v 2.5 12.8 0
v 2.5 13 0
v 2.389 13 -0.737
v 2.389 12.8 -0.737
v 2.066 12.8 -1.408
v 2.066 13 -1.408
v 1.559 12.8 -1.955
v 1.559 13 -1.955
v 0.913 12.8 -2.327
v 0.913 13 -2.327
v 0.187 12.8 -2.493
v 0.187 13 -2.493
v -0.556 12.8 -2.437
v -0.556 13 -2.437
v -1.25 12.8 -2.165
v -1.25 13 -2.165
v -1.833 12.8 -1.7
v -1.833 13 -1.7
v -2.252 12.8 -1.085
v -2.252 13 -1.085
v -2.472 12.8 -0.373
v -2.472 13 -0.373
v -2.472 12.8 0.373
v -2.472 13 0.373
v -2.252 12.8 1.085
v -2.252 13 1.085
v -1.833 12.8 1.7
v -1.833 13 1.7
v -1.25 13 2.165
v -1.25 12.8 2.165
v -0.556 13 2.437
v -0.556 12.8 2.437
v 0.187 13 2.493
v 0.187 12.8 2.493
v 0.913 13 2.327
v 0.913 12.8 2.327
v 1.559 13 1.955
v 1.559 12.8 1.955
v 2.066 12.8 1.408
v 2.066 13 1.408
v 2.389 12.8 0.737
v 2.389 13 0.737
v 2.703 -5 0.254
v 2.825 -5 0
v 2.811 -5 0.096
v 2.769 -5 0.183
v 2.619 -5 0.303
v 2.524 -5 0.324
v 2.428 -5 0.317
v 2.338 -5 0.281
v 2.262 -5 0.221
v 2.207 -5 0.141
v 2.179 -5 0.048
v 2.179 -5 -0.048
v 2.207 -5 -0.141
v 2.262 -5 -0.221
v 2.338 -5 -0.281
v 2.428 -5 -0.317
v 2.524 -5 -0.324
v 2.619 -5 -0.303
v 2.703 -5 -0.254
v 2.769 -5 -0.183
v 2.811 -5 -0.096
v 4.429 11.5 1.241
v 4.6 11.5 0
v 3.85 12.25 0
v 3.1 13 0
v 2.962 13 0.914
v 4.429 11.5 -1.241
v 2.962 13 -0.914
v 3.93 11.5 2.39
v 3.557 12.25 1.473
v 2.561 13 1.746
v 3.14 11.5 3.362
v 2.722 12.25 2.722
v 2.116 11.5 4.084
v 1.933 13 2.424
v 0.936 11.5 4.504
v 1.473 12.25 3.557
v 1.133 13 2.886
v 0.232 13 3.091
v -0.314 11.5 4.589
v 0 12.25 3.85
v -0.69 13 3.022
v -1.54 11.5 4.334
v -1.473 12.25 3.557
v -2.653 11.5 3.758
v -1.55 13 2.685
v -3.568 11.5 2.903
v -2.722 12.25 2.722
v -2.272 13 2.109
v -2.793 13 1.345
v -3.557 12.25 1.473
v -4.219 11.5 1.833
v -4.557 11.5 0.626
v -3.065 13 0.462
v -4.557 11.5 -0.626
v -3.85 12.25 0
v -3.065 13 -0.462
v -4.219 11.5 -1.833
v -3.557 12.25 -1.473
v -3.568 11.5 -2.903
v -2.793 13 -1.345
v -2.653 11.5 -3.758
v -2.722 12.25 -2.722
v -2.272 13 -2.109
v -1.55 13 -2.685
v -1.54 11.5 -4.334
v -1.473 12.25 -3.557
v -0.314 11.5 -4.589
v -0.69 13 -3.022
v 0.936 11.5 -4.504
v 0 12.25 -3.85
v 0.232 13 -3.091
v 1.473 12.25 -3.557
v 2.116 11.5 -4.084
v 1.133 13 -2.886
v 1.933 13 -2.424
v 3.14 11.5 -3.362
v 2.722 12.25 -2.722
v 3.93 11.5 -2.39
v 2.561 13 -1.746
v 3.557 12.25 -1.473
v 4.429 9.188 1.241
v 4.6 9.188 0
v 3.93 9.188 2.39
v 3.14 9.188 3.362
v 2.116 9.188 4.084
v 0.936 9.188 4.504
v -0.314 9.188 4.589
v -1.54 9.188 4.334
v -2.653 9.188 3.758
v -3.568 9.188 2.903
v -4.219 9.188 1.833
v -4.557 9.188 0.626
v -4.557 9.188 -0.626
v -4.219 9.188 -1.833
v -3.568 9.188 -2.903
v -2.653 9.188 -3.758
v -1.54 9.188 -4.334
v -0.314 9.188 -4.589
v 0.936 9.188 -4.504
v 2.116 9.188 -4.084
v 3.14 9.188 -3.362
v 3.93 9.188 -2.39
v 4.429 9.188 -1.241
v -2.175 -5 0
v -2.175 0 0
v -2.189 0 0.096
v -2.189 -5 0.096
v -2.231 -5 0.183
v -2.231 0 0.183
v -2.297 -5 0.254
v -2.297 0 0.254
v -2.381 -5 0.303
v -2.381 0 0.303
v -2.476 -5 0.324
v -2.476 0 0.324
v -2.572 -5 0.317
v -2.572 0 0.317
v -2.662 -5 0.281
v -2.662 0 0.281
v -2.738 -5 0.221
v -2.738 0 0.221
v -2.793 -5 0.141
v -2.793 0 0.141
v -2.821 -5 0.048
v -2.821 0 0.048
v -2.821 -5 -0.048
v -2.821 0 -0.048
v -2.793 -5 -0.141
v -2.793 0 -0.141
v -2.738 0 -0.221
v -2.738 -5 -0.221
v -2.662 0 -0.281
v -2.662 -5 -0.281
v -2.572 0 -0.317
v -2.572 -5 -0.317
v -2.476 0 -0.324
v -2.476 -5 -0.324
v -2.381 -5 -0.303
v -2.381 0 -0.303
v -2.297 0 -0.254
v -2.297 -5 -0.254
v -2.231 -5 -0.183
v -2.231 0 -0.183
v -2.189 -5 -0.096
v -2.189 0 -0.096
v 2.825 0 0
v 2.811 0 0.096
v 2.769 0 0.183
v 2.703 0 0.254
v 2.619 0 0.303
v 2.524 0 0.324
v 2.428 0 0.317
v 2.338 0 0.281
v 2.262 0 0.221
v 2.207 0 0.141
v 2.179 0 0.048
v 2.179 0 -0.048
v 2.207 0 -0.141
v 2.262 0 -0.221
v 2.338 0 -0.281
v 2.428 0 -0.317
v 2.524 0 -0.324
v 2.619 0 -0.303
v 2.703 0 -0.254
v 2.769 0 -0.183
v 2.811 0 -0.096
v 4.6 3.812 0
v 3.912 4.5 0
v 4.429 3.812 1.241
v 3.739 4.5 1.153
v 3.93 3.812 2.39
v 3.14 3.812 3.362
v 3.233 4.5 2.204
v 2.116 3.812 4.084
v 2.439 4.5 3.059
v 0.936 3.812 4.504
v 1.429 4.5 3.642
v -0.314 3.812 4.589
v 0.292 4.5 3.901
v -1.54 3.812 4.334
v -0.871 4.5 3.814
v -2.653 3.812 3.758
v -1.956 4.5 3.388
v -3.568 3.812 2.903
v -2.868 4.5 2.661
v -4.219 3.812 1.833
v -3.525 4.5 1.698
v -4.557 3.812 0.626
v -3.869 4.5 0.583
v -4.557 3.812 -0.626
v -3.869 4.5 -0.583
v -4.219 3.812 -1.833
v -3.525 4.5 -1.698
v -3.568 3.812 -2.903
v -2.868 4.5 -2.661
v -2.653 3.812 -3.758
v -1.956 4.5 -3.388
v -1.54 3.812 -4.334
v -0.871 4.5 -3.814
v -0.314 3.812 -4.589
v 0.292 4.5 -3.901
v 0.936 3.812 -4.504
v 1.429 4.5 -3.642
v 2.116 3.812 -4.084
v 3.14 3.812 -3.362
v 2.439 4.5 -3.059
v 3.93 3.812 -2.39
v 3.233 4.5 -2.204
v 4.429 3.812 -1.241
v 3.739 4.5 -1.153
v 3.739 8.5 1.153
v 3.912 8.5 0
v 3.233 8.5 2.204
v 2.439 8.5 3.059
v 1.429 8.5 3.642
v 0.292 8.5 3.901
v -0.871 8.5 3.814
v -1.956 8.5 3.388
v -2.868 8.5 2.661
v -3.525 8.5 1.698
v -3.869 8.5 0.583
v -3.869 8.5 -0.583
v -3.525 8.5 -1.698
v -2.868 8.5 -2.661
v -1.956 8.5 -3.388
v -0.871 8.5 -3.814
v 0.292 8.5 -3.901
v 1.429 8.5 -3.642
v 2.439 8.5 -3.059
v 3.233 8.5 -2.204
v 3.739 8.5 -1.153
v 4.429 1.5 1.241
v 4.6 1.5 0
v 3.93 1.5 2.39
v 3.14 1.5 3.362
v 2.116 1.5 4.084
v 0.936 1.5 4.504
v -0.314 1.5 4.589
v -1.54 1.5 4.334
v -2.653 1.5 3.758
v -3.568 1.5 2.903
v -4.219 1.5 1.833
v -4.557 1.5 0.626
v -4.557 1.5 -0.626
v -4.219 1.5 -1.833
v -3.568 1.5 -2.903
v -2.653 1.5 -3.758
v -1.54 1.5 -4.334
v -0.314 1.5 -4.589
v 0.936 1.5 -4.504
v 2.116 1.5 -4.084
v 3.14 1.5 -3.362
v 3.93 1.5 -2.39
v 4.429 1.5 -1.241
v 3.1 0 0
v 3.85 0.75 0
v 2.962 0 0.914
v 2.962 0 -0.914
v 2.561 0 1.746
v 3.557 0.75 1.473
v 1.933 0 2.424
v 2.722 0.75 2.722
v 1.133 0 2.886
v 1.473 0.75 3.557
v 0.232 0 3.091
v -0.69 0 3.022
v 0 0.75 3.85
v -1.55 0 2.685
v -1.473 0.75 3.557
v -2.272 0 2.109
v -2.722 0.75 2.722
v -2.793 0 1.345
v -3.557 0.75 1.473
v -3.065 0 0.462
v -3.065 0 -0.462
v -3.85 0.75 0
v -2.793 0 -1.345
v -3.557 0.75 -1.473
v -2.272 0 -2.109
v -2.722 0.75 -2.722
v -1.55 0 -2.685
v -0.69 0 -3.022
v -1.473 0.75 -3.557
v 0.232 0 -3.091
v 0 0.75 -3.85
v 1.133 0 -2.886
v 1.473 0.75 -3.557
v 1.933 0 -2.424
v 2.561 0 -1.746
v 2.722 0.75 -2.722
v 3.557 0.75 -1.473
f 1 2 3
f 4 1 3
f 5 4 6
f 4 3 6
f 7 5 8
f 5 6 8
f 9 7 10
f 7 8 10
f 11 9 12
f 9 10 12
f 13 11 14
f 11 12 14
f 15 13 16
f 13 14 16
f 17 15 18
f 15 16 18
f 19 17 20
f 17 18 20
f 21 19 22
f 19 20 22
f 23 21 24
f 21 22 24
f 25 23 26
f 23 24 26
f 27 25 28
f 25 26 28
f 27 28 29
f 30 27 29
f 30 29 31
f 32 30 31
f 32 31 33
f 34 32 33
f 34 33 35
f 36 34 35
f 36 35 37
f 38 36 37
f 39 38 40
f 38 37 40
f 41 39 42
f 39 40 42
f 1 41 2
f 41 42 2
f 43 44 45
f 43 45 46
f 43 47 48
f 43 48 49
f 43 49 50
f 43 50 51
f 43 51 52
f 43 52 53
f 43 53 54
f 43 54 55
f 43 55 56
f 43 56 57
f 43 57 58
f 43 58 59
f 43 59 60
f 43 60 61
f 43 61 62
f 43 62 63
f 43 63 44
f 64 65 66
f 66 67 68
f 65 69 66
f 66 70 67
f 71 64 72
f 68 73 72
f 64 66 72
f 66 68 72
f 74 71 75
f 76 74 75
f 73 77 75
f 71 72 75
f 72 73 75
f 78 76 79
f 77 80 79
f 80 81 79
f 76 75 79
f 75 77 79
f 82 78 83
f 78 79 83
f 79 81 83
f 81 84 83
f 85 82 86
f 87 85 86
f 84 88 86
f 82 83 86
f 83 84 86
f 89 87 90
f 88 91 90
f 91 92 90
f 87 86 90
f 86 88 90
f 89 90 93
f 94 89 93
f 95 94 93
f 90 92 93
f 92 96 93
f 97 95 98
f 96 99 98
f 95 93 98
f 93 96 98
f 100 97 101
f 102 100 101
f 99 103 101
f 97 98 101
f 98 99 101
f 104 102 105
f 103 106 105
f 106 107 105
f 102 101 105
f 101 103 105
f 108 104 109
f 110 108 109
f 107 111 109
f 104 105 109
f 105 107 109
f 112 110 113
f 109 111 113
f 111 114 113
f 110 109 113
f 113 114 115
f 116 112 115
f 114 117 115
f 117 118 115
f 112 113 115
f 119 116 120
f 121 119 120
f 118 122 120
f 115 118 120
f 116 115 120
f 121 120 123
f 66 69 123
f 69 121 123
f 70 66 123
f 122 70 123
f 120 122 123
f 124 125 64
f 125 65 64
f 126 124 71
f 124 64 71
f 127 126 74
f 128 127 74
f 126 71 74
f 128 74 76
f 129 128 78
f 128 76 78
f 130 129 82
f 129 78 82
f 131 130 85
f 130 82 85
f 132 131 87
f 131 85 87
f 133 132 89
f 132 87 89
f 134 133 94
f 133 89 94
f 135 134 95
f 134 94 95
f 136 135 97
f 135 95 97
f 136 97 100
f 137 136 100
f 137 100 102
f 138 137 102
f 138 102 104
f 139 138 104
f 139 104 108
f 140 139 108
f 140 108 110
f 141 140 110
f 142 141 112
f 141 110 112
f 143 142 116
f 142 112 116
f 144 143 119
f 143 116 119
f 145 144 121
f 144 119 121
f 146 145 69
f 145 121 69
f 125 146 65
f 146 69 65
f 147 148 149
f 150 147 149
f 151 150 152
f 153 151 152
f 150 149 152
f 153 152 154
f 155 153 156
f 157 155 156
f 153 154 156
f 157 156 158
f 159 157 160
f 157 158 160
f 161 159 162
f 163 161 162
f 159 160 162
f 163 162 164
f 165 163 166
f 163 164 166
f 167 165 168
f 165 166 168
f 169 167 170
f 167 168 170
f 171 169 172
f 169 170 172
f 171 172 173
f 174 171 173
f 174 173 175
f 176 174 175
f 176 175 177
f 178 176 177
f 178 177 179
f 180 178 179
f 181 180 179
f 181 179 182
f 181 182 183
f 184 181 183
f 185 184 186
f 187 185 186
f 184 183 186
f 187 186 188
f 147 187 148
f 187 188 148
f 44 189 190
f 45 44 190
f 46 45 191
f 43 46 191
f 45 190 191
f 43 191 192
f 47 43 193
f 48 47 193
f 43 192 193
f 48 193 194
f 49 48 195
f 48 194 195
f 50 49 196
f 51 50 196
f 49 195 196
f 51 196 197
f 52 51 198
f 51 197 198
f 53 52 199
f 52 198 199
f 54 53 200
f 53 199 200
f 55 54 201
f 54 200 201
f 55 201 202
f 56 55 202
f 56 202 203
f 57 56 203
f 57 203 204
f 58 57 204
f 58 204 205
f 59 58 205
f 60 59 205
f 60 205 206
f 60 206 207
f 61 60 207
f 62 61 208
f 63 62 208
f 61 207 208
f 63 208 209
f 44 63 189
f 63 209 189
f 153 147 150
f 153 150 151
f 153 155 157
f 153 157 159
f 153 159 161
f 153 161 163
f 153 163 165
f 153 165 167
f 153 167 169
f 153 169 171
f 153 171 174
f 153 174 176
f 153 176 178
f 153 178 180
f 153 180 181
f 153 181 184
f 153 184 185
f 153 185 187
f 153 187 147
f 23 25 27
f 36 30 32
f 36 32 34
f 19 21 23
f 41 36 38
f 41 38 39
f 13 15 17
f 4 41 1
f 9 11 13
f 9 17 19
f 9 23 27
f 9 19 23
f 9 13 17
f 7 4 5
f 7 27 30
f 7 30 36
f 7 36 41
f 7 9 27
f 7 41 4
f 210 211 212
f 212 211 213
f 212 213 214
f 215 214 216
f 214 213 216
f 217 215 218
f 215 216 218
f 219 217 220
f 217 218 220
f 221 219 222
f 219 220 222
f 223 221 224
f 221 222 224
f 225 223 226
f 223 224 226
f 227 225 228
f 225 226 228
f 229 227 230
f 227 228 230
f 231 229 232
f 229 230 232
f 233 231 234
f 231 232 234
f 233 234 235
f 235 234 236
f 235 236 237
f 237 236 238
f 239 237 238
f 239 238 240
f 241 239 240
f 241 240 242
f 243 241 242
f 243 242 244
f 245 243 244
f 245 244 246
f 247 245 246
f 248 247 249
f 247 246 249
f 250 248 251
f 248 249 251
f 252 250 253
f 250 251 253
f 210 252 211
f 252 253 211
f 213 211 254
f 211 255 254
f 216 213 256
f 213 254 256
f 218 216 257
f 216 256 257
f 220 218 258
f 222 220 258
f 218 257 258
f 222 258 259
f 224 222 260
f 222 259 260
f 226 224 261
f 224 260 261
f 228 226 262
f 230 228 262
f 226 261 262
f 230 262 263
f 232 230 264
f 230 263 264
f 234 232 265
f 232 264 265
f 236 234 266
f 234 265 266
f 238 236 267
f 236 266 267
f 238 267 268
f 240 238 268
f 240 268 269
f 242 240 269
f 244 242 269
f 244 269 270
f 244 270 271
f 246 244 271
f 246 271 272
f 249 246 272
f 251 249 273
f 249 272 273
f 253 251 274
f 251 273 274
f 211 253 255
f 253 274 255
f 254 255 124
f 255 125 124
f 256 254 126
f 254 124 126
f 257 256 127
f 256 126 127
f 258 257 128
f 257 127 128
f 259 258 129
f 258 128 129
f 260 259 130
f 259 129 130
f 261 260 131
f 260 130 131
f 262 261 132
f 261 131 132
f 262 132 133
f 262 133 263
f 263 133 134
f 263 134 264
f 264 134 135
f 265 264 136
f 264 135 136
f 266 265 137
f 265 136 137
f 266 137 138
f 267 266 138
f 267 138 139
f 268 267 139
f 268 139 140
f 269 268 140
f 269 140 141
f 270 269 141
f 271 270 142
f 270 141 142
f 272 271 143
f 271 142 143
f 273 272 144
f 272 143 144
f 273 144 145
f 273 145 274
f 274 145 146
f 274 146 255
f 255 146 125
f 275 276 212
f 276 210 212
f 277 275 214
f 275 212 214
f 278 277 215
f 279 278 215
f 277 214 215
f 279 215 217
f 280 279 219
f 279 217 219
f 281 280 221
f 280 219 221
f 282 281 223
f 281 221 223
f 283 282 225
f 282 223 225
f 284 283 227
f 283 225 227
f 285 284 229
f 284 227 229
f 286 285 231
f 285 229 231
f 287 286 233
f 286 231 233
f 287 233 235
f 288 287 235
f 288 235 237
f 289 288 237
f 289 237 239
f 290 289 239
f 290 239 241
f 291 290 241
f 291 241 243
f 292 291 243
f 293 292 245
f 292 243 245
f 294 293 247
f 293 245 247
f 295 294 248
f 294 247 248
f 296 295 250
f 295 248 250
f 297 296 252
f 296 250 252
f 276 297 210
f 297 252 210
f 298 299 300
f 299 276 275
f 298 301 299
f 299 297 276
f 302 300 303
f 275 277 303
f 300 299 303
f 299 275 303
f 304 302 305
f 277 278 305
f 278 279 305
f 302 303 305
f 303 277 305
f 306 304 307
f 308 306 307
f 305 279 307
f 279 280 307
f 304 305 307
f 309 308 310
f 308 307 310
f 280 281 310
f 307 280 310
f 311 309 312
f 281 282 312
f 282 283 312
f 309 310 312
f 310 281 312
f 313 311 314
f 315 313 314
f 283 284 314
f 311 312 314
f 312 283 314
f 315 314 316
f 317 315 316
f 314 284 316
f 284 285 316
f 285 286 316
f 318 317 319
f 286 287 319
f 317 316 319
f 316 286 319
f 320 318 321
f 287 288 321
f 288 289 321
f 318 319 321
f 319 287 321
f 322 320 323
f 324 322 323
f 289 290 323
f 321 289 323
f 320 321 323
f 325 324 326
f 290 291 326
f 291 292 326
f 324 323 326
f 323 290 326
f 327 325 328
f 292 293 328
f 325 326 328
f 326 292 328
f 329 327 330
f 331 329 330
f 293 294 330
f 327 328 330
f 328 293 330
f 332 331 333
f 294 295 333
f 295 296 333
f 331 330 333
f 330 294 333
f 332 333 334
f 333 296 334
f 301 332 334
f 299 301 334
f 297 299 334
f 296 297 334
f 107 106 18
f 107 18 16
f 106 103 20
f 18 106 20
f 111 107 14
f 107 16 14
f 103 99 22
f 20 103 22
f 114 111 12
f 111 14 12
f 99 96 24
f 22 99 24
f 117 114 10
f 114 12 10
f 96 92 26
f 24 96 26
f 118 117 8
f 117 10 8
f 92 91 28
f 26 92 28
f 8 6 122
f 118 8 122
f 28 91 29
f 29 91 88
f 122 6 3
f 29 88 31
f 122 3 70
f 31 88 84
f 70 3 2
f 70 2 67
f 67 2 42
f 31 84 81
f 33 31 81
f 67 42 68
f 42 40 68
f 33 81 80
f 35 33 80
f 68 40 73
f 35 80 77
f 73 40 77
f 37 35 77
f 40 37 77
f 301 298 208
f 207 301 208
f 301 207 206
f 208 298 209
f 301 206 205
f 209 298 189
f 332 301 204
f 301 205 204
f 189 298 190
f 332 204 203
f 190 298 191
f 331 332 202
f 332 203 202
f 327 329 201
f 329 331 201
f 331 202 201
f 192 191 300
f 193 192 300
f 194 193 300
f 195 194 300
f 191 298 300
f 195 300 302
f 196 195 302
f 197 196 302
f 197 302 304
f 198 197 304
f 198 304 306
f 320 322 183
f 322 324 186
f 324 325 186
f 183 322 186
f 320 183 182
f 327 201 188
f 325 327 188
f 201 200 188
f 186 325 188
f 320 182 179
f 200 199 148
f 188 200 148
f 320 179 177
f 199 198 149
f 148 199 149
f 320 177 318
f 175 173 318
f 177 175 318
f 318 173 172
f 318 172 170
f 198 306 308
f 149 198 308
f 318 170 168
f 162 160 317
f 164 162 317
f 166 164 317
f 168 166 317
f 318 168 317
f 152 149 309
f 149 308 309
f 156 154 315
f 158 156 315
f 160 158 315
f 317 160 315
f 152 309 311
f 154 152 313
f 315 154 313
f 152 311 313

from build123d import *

# Parameters (mm, degrees)
SKETCH_7_R          = 0.325
EXTRUDE_1_DEPTH     = 5
SKETCH_8_R          = 2.5
CUT_EXTRUDE_1_DEPTH = 0.2


with BuildPart() as part:
    # Эскиз6 → Повернуть1 (revolve)
    with BuildSketch(Plane.XY):
        Polygon((0, 13), (0, 0), (3.1, 0), (4.6, 1.5), (4.6, 3.812414318), (3.912414318, 4.5), (3.912414318, 8.5), (4.6, 9.187585682), (4.6, 11.5), (3.1, 13), align=None)
    revolve(axis=Axis((0, 13, 0), (0, -1, 0)))

    # Эскиз7 → Бобышка-Вытянуть1 (add)
    with BuildSketch(Plane.XZ):
        with Locations((2.5, 0)):
            Circle(SKETCH_7_R)
        with Locations((-2.5, 0)):
            Circle(SKETCH_7_R)
    extrude(amount=EXTRUDE_1_DEPTH)

    # Эскиз8 → Вырез-Вытянуть1 (cut)
    with BuildSketch(Plane(origin=(0, 13, 0), x_dir=(1, 0, 0), z_dir=(0, 1, 0))):
        Circle(SKETCH_8_R)
    extrude(amount=-CUT_EXTRUDE_1_DEPTH, mode=Mode.SUBTRACT)


solid = part.part
